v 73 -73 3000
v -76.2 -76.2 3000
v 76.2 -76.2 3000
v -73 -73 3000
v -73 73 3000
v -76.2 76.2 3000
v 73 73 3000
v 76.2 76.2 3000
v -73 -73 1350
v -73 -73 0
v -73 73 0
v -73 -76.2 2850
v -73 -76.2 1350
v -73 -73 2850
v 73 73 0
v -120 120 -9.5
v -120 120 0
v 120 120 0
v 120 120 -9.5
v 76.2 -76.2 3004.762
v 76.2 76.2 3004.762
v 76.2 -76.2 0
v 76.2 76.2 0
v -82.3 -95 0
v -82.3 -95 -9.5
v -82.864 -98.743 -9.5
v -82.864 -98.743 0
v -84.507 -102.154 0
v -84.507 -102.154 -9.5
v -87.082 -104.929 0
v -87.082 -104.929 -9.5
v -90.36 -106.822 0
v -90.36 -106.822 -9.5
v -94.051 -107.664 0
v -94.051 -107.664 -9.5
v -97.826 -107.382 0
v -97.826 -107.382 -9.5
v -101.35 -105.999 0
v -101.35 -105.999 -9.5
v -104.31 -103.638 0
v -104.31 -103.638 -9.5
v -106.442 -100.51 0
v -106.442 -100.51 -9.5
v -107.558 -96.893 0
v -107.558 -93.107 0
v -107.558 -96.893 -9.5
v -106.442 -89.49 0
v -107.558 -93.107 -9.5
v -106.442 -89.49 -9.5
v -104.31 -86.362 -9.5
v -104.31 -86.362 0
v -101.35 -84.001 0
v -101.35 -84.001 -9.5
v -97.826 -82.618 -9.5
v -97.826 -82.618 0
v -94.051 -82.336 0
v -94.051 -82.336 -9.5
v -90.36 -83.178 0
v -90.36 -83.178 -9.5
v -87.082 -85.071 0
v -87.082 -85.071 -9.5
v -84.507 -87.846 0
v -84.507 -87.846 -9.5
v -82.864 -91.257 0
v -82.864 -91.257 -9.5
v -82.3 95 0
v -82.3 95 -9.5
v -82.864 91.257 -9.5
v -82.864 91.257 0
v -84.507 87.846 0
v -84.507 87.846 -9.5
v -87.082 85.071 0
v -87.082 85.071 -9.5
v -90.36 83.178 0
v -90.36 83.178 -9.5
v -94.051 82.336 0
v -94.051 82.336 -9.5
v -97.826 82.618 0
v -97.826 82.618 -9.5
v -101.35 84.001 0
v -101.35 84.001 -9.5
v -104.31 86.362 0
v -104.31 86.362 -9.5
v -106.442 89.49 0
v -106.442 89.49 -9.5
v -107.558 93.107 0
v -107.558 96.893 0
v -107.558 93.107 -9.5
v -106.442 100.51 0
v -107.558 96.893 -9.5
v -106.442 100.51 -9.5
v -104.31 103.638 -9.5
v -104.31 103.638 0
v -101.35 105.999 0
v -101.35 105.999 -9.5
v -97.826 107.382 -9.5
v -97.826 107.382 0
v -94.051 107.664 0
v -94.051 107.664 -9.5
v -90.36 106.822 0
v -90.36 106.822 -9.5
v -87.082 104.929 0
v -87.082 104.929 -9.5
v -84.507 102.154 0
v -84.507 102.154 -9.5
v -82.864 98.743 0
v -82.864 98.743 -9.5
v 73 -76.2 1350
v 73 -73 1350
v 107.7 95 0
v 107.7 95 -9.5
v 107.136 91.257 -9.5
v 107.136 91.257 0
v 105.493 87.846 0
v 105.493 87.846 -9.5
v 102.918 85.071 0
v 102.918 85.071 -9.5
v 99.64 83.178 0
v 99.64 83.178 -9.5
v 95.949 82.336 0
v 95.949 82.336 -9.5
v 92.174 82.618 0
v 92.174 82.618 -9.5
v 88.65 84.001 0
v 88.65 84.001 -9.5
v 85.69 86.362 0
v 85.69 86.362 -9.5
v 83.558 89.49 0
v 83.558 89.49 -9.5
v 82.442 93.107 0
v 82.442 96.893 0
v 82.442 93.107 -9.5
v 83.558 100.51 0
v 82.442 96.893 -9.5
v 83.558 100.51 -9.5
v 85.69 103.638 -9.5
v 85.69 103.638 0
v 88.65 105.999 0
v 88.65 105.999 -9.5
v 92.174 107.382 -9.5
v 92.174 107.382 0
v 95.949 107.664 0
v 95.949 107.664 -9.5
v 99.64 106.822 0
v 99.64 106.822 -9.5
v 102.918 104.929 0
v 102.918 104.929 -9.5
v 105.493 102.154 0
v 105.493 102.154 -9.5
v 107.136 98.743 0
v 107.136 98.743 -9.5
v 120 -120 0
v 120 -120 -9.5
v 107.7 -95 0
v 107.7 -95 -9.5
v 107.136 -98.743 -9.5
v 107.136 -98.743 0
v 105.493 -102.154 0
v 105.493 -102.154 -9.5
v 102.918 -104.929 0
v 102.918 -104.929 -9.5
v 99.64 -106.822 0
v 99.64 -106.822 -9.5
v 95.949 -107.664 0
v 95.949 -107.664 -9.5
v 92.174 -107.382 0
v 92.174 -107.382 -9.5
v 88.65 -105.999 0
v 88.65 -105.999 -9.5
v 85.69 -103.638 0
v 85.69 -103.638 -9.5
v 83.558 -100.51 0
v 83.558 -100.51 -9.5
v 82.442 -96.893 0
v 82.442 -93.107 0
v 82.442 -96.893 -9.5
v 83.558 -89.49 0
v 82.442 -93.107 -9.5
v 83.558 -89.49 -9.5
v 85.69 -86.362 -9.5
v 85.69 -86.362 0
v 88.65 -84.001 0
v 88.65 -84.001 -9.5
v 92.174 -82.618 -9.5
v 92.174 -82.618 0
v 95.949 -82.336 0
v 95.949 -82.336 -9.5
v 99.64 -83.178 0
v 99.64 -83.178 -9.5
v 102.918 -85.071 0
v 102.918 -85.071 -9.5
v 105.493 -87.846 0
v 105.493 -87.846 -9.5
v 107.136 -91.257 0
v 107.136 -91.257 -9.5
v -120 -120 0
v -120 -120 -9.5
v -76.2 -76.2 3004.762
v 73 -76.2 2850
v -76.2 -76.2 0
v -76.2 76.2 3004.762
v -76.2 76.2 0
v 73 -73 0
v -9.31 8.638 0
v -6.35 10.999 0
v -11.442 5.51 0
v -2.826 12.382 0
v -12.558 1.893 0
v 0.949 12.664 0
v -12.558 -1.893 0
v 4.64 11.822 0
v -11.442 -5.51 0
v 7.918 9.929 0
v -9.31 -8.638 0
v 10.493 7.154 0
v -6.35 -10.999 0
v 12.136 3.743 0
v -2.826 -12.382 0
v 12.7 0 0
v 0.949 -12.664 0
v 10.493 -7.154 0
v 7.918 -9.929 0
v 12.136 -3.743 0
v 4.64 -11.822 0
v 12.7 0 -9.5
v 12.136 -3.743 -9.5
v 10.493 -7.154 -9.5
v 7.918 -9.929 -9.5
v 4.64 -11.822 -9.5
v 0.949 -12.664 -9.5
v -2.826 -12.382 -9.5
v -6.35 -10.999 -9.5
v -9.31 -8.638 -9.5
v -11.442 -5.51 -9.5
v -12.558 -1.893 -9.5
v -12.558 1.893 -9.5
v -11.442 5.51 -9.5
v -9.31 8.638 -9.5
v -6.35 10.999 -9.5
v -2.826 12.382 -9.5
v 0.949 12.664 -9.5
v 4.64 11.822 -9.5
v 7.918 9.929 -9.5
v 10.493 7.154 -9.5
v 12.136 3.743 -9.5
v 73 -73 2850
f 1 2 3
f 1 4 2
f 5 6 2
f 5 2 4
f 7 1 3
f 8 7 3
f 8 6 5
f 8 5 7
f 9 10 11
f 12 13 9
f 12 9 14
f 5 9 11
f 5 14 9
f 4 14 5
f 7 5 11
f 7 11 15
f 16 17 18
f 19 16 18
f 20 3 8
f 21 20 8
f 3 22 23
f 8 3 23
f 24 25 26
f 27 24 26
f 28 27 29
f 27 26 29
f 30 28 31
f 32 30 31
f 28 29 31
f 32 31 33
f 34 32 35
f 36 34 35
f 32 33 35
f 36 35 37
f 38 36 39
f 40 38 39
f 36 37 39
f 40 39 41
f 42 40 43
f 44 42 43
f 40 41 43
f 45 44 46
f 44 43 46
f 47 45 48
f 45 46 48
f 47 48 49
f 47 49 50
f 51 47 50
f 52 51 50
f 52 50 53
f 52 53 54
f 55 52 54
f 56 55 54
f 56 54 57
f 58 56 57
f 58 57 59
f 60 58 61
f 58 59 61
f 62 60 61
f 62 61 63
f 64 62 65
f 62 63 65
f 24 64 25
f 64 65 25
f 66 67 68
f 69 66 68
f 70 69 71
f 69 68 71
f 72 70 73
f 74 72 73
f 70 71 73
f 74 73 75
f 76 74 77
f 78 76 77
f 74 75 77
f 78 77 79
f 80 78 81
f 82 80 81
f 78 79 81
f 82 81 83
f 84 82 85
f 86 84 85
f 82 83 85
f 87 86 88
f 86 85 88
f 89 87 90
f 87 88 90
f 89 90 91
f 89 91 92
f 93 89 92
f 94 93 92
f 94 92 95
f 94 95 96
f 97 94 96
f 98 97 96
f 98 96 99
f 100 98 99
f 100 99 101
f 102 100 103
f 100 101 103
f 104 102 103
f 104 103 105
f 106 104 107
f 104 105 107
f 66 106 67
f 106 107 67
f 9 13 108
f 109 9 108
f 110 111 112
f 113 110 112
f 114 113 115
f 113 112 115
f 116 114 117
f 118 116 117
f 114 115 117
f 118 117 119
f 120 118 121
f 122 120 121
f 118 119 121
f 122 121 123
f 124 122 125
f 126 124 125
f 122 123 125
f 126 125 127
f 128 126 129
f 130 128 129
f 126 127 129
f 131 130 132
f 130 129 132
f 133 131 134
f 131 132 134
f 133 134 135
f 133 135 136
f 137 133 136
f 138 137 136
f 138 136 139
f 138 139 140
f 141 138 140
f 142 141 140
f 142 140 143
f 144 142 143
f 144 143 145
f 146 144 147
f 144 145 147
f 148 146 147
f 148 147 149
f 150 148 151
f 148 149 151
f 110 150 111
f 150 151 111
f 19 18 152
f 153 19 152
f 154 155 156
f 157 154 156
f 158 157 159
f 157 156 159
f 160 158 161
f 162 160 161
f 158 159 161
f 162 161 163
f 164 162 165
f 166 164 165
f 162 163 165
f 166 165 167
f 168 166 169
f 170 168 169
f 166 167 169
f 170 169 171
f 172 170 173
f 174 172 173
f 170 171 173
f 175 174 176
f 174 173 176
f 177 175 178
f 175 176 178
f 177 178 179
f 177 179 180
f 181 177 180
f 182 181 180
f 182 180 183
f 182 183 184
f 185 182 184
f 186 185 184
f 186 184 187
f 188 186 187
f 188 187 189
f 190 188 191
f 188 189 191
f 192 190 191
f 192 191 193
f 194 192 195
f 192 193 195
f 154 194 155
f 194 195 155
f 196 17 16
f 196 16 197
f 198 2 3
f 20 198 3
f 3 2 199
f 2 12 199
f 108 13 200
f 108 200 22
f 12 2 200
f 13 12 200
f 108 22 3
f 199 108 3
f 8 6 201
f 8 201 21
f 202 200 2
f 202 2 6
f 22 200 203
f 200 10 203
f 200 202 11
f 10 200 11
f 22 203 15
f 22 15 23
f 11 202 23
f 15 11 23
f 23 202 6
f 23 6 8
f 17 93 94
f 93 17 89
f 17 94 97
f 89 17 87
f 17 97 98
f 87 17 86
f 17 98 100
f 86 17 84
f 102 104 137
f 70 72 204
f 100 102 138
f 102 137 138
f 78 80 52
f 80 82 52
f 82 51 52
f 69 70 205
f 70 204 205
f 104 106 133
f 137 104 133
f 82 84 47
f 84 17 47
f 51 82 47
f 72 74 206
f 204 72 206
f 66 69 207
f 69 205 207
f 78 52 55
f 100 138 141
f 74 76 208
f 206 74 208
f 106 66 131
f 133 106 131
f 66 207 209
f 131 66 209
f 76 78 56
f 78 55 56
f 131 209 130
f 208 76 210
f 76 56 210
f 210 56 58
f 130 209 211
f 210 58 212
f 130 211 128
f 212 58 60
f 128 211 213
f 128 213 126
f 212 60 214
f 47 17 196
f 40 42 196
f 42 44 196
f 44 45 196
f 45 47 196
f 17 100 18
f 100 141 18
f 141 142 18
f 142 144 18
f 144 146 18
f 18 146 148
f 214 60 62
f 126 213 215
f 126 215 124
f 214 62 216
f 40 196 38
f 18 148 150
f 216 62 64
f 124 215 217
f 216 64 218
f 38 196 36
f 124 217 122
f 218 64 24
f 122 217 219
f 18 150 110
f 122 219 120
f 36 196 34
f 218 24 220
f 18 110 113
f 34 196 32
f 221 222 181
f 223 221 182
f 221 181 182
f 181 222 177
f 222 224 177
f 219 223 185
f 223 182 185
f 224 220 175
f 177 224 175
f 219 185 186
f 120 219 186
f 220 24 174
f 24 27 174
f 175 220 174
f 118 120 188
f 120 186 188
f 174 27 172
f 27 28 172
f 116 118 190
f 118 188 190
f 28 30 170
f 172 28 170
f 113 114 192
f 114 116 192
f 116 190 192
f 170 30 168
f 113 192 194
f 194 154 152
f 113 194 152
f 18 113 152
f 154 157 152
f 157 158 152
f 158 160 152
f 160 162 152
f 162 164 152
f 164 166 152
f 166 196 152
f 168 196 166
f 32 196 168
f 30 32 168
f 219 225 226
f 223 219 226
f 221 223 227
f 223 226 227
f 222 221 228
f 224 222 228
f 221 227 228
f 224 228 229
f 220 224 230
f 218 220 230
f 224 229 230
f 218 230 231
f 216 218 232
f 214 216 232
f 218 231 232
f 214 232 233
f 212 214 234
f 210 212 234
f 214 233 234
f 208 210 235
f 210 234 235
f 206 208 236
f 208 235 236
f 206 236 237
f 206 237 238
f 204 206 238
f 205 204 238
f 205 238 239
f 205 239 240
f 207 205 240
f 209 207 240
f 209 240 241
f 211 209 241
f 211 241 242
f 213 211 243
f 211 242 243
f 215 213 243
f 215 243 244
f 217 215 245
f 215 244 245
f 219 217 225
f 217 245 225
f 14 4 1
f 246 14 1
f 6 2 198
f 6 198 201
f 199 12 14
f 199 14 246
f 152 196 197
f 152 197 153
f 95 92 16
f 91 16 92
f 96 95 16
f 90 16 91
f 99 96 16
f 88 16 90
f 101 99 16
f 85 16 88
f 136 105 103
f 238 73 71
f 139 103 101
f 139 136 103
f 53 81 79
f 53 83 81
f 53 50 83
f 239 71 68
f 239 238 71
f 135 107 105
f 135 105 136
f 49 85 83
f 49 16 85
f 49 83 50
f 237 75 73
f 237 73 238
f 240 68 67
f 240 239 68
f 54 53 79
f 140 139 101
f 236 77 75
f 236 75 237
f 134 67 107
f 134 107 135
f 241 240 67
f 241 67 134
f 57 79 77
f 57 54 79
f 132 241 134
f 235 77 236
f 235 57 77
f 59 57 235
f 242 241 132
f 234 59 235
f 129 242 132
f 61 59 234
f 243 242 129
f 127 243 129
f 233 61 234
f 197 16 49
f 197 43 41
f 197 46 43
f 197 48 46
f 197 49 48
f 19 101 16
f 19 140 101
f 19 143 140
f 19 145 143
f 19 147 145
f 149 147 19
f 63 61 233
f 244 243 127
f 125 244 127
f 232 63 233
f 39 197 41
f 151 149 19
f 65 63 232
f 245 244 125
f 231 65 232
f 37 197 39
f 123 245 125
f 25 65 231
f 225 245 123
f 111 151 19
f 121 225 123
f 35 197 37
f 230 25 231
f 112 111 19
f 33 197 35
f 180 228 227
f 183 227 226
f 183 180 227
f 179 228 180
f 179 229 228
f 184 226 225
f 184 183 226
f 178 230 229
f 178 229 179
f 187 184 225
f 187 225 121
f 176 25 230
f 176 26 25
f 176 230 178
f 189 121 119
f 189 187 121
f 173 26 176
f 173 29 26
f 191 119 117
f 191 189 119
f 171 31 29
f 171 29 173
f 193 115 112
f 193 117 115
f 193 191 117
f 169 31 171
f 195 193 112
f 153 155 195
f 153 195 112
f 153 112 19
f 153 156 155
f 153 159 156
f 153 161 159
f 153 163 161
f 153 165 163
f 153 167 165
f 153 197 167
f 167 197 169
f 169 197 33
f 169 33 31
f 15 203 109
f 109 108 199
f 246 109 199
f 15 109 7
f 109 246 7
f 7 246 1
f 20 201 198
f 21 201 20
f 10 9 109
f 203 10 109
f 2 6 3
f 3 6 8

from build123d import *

# Parameters (mm, degrees)
F0_W      = 152.4
F0_H      = 152.4
F0_W_2    = 146
F0_H_2    = 146
F1_DEPTH  = 3000
F2_W      = 146
F2_H      = 1500
F3_DEPTH  = 148.8
F6_W      = 152.4
F6_H      = 152.4
F6_W_2    = 146
F6_H_2    = 146
F7_DEPTH  = 4.762
F8_W      = 240
F8_H      = 240
F9_DEPTH  = 9.5
F10_R     = 12.7
F11_DEPTH = 9.5


# Not quite as in the source:
# - the program builds the solid bodies; features that only make, move or delete a surface that nothing else refers to are left out


with BuildPart() as f1:
    # F0 (on Top) → F1 (new body)
    with BuildSketch(Plane.XY):
        Rectangle(F0_W, F0_H)
        Rectangle(F0_W_2, F0_H_2, mode=Mode.SUBTRACT)
    extrude(amount=F1_DEPTH)

    # F2 (on face) → F3 (cut)
    with BuildSketch(Plane.XZ.offset(76.2)):
        with Locations((0, 2100)):
            Rectangle(F2_W, F2_H)
    extrude(amount=-F3_DEPTH, mode=Mode.SUBTRACT)


with BuildPart() as f7:
    # F6 (on face) → F7 (new body)
    with BuildSketch(Plane.XY.offset(3000)):
        Rectangle(F6_W, F6_H)
        Rectangle(F6_W_2, F6_H_2, mode=Mode.SUBTRACT)
        Rectangle(F6_W_2, F6_H_2)
    extrude(amount=F7_DEPTH)


with BuildPart() as f9:
    # F8 (on face) → F9 (new body)
    with BuildSketch(Plane(origin=(0, 0, 0), x_dir=(1, 0, 0), z_dir=(0, 0, -1))):
        Rectangle(F8_W, F8_H)
    extrude(amount=F9_DEPTH)

    # F10 (on face) → F11 (cut, through all)
    with BuildSketch(Plane(origin=(0, 0, -9.5), x_dir=(1, 0, 0), z_dir=(0, 0, -1))):
        with Locations((-95, 95)):
            Circle(F10_R)
        with Locations((-95, -95)):
            Circle(F10_R)
        with Locations((95, 95)):
            Circle(F10_R)
        with Locations((95, -95)):
            Circle(F10_R)
        Circle(F10_R)
    extrude(amount=-F11_DEPTH, mode=Mode.SUBTRACT)


solid = Compound([f1.part, f7.part, f9.part])
